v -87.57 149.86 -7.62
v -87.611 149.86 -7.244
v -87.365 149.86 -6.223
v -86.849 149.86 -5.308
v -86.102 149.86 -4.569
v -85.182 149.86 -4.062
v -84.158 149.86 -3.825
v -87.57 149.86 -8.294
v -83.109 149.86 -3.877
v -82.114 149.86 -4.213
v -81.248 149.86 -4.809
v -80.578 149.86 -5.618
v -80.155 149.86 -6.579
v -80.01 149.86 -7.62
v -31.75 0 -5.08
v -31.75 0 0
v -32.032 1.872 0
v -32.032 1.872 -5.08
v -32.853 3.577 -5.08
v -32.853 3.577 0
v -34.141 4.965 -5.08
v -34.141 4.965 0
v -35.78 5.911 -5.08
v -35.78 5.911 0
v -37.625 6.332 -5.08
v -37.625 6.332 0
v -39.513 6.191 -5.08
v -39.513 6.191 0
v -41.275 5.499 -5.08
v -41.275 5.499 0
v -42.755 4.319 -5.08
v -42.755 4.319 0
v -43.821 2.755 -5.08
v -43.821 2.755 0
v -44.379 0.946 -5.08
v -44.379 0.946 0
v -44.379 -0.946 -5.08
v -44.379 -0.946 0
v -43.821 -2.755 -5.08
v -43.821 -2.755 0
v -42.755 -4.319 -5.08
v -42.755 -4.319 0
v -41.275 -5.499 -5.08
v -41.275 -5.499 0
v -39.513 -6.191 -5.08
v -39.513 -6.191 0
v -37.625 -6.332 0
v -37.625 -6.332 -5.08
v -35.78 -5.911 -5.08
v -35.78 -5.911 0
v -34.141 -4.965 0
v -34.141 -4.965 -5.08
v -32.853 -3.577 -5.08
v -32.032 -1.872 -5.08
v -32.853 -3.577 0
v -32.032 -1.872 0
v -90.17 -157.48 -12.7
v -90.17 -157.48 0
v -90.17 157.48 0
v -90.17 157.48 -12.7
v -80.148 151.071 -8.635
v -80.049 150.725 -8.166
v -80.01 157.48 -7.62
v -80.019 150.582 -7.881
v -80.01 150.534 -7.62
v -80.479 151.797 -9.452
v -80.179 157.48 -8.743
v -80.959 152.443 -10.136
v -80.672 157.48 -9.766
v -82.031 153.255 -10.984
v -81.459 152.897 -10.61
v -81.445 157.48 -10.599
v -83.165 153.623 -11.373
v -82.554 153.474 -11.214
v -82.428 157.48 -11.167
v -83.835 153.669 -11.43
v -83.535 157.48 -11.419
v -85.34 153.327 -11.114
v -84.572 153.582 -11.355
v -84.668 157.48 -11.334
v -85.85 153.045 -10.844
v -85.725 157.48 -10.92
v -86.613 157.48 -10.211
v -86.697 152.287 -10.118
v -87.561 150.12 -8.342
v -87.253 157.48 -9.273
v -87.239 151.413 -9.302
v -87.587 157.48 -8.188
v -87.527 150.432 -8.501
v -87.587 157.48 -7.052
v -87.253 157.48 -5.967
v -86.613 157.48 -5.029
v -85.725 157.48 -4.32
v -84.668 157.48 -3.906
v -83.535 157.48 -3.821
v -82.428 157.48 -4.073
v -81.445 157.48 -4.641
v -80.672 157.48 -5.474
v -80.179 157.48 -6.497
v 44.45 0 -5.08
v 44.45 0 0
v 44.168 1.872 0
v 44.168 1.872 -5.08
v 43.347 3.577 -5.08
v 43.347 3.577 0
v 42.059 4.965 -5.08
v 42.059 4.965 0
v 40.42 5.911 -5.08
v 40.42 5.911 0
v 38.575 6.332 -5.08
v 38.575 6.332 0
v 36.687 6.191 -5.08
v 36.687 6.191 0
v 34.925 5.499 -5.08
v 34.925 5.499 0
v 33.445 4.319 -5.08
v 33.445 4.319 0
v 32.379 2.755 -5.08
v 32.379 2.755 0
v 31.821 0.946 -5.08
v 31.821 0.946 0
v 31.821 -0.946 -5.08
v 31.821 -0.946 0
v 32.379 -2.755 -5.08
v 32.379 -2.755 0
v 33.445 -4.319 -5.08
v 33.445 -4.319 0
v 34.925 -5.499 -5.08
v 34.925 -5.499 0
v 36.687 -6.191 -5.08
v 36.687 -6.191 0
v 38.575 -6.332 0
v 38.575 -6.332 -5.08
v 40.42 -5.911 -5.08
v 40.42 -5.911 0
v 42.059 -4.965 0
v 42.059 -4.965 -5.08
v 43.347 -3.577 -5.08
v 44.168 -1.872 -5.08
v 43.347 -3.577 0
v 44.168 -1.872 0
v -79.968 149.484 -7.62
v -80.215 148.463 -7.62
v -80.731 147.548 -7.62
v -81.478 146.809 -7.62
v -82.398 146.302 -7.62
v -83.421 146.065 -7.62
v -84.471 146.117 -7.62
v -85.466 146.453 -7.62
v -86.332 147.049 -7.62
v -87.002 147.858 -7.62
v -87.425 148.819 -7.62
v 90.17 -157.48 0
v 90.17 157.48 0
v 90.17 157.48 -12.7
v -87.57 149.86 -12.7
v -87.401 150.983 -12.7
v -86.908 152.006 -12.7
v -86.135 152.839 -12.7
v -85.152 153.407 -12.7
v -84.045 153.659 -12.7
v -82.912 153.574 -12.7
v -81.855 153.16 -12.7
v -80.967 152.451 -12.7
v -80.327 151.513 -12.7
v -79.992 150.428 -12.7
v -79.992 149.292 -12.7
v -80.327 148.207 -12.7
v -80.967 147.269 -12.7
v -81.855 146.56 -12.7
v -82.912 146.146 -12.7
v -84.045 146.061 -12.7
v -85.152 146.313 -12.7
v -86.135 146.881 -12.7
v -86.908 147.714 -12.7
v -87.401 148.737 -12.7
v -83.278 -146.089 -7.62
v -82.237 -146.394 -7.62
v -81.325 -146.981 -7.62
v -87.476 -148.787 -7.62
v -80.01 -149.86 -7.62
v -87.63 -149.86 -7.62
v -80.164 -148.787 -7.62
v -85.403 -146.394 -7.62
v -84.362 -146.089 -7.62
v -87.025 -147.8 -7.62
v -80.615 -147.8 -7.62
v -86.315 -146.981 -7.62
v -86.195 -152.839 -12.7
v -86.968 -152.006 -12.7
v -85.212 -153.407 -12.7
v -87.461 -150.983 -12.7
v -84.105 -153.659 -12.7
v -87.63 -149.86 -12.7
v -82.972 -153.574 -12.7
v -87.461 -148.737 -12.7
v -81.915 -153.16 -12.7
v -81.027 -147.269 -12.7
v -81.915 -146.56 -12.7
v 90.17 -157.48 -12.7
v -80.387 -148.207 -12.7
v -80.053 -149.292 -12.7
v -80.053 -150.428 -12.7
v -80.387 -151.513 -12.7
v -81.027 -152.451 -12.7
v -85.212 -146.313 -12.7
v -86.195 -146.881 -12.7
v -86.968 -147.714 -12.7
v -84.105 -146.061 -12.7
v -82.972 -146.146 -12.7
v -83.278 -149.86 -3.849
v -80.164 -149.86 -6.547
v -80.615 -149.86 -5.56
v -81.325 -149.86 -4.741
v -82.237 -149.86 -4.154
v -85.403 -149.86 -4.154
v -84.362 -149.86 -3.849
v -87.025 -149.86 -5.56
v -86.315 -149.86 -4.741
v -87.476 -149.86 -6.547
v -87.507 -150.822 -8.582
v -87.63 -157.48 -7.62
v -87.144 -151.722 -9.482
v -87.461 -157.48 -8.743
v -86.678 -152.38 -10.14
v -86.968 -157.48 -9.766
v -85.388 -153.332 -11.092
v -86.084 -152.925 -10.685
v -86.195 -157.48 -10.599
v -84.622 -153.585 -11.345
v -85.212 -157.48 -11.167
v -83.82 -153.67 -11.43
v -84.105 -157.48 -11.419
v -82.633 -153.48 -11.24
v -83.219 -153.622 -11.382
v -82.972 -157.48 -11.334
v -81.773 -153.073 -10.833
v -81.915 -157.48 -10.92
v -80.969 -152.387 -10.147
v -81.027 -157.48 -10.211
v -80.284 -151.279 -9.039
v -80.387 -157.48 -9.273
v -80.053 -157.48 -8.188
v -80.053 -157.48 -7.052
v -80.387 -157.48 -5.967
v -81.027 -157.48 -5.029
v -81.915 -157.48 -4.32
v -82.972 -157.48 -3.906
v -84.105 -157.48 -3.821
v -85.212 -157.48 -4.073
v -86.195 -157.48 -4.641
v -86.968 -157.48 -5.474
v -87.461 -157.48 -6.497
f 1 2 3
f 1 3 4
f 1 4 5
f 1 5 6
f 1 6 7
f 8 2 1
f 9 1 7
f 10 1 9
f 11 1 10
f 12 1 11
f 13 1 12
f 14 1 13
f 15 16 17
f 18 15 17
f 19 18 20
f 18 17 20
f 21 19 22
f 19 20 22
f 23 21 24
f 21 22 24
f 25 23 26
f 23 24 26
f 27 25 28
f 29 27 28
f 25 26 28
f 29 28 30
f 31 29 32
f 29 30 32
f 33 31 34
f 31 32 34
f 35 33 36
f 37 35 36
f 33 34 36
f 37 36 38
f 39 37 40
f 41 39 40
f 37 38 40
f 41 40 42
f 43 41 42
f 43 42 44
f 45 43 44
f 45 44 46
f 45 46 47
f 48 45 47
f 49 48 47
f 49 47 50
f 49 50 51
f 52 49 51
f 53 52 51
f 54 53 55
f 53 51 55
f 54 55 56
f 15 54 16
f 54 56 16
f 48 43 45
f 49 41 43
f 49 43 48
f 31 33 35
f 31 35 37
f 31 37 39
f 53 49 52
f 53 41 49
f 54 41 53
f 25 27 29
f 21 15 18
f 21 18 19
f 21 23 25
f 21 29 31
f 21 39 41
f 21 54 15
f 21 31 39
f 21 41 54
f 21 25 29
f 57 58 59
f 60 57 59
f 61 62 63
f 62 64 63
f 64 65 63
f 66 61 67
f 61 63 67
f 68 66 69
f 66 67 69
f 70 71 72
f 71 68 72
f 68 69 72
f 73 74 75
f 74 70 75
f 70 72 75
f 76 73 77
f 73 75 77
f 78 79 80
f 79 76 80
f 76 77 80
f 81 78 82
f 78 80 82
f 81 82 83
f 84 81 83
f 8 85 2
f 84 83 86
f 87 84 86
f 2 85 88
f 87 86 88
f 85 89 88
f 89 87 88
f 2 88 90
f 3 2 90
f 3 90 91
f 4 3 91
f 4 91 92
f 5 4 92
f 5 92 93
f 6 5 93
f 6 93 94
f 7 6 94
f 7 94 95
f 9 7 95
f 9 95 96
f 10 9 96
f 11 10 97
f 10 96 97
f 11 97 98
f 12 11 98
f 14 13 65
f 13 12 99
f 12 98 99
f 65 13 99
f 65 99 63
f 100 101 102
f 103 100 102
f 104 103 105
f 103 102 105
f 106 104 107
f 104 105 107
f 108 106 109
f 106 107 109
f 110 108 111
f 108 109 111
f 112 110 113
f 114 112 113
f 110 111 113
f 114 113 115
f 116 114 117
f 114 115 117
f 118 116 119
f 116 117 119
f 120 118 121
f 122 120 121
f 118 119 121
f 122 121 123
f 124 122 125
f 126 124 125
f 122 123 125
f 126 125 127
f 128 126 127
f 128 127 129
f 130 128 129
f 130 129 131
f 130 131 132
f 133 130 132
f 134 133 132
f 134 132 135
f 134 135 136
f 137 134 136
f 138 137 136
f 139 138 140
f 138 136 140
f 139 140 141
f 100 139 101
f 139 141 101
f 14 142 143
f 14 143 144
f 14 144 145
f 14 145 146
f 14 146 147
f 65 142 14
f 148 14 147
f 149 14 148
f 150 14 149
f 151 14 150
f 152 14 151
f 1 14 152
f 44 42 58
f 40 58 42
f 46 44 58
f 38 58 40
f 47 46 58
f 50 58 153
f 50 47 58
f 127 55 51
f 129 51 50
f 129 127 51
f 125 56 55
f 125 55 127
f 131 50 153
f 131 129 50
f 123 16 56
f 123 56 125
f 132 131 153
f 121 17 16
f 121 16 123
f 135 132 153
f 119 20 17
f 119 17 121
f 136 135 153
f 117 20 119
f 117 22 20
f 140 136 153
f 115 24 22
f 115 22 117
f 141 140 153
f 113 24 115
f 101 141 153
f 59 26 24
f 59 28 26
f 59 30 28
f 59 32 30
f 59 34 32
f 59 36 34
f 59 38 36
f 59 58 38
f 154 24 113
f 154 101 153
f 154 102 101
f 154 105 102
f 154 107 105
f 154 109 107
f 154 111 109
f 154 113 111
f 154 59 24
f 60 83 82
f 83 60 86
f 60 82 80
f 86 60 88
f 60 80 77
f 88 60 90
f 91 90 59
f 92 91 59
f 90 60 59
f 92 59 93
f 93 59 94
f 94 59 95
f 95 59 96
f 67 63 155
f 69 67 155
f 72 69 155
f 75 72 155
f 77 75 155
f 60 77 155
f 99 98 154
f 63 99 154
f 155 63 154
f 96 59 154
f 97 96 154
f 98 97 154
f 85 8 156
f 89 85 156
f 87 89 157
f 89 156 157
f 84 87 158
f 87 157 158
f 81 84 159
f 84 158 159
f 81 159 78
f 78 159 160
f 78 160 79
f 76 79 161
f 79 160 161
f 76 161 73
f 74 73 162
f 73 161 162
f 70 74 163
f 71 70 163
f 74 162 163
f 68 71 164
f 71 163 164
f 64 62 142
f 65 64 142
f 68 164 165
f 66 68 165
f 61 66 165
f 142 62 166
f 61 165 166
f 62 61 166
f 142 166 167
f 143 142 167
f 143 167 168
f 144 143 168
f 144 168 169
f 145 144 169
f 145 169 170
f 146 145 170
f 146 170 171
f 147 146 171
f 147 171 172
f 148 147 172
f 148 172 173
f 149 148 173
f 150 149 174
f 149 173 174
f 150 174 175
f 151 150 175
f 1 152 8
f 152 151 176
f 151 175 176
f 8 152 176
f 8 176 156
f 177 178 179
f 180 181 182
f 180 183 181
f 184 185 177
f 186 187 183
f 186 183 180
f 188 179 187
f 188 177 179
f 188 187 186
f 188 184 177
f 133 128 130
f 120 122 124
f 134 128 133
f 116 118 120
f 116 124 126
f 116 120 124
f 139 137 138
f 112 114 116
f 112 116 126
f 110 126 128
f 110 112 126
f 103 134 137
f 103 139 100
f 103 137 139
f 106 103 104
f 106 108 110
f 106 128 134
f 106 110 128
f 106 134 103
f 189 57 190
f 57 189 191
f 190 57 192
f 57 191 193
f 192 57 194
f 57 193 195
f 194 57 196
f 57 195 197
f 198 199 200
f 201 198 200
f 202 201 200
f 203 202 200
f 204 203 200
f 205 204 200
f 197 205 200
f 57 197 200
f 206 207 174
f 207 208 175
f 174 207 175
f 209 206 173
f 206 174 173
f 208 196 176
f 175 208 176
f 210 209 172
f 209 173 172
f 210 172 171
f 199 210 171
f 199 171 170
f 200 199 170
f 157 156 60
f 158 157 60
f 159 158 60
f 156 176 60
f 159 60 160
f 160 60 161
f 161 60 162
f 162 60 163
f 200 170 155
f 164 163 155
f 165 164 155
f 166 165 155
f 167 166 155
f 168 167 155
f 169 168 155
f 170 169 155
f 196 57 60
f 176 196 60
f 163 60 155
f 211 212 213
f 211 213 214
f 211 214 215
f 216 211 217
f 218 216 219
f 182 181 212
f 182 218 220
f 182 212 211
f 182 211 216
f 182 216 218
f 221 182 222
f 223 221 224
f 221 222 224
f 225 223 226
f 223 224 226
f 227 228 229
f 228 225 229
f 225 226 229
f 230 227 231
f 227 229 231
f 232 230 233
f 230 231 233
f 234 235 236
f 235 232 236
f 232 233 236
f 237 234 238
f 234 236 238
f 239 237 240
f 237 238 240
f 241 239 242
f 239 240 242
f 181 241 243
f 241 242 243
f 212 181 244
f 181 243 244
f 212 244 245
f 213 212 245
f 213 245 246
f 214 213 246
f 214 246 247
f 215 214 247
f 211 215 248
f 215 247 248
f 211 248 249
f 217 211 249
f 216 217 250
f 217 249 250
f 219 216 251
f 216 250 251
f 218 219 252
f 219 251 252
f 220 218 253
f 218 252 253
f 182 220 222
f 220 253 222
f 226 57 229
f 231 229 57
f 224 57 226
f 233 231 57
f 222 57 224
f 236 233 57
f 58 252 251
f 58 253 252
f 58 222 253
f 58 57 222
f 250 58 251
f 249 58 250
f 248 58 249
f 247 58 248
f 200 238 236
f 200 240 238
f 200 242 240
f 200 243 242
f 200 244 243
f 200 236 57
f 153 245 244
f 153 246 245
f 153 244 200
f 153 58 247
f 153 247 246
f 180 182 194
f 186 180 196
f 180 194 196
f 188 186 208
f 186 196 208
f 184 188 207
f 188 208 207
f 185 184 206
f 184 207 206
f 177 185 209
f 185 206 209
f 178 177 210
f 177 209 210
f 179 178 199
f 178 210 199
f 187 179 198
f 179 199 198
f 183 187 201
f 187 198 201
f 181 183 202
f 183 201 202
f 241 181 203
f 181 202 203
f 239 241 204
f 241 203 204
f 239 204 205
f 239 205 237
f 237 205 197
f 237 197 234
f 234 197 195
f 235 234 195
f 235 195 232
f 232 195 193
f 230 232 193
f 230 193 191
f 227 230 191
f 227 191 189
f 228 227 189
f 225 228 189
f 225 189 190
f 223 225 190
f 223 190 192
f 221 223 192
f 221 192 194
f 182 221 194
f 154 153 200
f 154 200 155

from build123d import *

# Parameters (mm, degrees)
SKETCH1_W           = 180.34
SKETCH1_H           = 314.96
BOSS_EXTRUDE1_DEPTH = 12.7
SKETCH4_R           = 6.35
CUT_EXTRUDE2_DEPTH  = 5.08
SKETCH6_R           = 3.81
CUT_EXTRUDE3_DEPTH  = 5.08
SKETCH7_R           = 3.81
CUT_EXTRUDE4_DEPTH  = 7.62
SKETCH8_R           = 3.81
CUT_EXTRUDE5_DEPTH  = 7.62


with BuildPart() as part:
    # Sketch1 → Boss-Extrude1 (new body)
    with BuildSketch(Plane.XY):
        Rectangle(SKETCH1_W, SKETCH1_H)
    extrude(amount=-BOSS_EXTRUDE1_DEPTH)

    # Sketch4 → Cut-Extrude2 (cut)
    with BuildSketch(Plane.XY):
        with Locations((-38.1, 0)):
            Circle(SKETCH4_R)
        with Locations((38.1, 0)):
            Circle(SKETCH4_R)
    extrude(amount=-CUT_EXTRUDE2_DEPTH, mode=Mode.SUBTRACT)

    # Sketch6 → Cut-Extrude3 (cut)
    with BuildSketch(Plane(origin=(0, 0, -12.7), x_dir=(-1, 0, 0), z_dir=(0, 0, -1))):
        with Locations((83.759872632, 149.86)):
            Circle(SKETCH6_R)
        with Locations((83.82, -149.86)):
            Circle(SKETCH6_R)
    extrude(amount=-CUT_EXTRUDE3_DEPTH, mode=Mode.SUBTRACT)

    # Sketch7 → Cut-Extrude4 (cut)
    with BuildSketch(Plane(origin=(0, 157.48, 0), x_dir=(1, 0, 0), z_dir=(0, 1, 0))):
        with Locations((-83.82, 7.62)):
            Circle(SKETCH7_R)
    extrude(amount=-CUT_EXTRUDE4_DEPTH, mode=Mode.SUBTRACT)

    # Sketch8 → Cut-Extrude5 (cut)
    with BuildSketch(Plane(origin=(0, -157.48, 0), x_dir=(-1, 0, 0), z_dir=(0, -1, 0))):
        with Locations((83.82, 7.62)):
            Circle(SKETCH8_R)
    extrude(amount=-CUT_EXTRUDE5_DEPTH, mode=Mode.SUBTRACT)


solid = part.part
